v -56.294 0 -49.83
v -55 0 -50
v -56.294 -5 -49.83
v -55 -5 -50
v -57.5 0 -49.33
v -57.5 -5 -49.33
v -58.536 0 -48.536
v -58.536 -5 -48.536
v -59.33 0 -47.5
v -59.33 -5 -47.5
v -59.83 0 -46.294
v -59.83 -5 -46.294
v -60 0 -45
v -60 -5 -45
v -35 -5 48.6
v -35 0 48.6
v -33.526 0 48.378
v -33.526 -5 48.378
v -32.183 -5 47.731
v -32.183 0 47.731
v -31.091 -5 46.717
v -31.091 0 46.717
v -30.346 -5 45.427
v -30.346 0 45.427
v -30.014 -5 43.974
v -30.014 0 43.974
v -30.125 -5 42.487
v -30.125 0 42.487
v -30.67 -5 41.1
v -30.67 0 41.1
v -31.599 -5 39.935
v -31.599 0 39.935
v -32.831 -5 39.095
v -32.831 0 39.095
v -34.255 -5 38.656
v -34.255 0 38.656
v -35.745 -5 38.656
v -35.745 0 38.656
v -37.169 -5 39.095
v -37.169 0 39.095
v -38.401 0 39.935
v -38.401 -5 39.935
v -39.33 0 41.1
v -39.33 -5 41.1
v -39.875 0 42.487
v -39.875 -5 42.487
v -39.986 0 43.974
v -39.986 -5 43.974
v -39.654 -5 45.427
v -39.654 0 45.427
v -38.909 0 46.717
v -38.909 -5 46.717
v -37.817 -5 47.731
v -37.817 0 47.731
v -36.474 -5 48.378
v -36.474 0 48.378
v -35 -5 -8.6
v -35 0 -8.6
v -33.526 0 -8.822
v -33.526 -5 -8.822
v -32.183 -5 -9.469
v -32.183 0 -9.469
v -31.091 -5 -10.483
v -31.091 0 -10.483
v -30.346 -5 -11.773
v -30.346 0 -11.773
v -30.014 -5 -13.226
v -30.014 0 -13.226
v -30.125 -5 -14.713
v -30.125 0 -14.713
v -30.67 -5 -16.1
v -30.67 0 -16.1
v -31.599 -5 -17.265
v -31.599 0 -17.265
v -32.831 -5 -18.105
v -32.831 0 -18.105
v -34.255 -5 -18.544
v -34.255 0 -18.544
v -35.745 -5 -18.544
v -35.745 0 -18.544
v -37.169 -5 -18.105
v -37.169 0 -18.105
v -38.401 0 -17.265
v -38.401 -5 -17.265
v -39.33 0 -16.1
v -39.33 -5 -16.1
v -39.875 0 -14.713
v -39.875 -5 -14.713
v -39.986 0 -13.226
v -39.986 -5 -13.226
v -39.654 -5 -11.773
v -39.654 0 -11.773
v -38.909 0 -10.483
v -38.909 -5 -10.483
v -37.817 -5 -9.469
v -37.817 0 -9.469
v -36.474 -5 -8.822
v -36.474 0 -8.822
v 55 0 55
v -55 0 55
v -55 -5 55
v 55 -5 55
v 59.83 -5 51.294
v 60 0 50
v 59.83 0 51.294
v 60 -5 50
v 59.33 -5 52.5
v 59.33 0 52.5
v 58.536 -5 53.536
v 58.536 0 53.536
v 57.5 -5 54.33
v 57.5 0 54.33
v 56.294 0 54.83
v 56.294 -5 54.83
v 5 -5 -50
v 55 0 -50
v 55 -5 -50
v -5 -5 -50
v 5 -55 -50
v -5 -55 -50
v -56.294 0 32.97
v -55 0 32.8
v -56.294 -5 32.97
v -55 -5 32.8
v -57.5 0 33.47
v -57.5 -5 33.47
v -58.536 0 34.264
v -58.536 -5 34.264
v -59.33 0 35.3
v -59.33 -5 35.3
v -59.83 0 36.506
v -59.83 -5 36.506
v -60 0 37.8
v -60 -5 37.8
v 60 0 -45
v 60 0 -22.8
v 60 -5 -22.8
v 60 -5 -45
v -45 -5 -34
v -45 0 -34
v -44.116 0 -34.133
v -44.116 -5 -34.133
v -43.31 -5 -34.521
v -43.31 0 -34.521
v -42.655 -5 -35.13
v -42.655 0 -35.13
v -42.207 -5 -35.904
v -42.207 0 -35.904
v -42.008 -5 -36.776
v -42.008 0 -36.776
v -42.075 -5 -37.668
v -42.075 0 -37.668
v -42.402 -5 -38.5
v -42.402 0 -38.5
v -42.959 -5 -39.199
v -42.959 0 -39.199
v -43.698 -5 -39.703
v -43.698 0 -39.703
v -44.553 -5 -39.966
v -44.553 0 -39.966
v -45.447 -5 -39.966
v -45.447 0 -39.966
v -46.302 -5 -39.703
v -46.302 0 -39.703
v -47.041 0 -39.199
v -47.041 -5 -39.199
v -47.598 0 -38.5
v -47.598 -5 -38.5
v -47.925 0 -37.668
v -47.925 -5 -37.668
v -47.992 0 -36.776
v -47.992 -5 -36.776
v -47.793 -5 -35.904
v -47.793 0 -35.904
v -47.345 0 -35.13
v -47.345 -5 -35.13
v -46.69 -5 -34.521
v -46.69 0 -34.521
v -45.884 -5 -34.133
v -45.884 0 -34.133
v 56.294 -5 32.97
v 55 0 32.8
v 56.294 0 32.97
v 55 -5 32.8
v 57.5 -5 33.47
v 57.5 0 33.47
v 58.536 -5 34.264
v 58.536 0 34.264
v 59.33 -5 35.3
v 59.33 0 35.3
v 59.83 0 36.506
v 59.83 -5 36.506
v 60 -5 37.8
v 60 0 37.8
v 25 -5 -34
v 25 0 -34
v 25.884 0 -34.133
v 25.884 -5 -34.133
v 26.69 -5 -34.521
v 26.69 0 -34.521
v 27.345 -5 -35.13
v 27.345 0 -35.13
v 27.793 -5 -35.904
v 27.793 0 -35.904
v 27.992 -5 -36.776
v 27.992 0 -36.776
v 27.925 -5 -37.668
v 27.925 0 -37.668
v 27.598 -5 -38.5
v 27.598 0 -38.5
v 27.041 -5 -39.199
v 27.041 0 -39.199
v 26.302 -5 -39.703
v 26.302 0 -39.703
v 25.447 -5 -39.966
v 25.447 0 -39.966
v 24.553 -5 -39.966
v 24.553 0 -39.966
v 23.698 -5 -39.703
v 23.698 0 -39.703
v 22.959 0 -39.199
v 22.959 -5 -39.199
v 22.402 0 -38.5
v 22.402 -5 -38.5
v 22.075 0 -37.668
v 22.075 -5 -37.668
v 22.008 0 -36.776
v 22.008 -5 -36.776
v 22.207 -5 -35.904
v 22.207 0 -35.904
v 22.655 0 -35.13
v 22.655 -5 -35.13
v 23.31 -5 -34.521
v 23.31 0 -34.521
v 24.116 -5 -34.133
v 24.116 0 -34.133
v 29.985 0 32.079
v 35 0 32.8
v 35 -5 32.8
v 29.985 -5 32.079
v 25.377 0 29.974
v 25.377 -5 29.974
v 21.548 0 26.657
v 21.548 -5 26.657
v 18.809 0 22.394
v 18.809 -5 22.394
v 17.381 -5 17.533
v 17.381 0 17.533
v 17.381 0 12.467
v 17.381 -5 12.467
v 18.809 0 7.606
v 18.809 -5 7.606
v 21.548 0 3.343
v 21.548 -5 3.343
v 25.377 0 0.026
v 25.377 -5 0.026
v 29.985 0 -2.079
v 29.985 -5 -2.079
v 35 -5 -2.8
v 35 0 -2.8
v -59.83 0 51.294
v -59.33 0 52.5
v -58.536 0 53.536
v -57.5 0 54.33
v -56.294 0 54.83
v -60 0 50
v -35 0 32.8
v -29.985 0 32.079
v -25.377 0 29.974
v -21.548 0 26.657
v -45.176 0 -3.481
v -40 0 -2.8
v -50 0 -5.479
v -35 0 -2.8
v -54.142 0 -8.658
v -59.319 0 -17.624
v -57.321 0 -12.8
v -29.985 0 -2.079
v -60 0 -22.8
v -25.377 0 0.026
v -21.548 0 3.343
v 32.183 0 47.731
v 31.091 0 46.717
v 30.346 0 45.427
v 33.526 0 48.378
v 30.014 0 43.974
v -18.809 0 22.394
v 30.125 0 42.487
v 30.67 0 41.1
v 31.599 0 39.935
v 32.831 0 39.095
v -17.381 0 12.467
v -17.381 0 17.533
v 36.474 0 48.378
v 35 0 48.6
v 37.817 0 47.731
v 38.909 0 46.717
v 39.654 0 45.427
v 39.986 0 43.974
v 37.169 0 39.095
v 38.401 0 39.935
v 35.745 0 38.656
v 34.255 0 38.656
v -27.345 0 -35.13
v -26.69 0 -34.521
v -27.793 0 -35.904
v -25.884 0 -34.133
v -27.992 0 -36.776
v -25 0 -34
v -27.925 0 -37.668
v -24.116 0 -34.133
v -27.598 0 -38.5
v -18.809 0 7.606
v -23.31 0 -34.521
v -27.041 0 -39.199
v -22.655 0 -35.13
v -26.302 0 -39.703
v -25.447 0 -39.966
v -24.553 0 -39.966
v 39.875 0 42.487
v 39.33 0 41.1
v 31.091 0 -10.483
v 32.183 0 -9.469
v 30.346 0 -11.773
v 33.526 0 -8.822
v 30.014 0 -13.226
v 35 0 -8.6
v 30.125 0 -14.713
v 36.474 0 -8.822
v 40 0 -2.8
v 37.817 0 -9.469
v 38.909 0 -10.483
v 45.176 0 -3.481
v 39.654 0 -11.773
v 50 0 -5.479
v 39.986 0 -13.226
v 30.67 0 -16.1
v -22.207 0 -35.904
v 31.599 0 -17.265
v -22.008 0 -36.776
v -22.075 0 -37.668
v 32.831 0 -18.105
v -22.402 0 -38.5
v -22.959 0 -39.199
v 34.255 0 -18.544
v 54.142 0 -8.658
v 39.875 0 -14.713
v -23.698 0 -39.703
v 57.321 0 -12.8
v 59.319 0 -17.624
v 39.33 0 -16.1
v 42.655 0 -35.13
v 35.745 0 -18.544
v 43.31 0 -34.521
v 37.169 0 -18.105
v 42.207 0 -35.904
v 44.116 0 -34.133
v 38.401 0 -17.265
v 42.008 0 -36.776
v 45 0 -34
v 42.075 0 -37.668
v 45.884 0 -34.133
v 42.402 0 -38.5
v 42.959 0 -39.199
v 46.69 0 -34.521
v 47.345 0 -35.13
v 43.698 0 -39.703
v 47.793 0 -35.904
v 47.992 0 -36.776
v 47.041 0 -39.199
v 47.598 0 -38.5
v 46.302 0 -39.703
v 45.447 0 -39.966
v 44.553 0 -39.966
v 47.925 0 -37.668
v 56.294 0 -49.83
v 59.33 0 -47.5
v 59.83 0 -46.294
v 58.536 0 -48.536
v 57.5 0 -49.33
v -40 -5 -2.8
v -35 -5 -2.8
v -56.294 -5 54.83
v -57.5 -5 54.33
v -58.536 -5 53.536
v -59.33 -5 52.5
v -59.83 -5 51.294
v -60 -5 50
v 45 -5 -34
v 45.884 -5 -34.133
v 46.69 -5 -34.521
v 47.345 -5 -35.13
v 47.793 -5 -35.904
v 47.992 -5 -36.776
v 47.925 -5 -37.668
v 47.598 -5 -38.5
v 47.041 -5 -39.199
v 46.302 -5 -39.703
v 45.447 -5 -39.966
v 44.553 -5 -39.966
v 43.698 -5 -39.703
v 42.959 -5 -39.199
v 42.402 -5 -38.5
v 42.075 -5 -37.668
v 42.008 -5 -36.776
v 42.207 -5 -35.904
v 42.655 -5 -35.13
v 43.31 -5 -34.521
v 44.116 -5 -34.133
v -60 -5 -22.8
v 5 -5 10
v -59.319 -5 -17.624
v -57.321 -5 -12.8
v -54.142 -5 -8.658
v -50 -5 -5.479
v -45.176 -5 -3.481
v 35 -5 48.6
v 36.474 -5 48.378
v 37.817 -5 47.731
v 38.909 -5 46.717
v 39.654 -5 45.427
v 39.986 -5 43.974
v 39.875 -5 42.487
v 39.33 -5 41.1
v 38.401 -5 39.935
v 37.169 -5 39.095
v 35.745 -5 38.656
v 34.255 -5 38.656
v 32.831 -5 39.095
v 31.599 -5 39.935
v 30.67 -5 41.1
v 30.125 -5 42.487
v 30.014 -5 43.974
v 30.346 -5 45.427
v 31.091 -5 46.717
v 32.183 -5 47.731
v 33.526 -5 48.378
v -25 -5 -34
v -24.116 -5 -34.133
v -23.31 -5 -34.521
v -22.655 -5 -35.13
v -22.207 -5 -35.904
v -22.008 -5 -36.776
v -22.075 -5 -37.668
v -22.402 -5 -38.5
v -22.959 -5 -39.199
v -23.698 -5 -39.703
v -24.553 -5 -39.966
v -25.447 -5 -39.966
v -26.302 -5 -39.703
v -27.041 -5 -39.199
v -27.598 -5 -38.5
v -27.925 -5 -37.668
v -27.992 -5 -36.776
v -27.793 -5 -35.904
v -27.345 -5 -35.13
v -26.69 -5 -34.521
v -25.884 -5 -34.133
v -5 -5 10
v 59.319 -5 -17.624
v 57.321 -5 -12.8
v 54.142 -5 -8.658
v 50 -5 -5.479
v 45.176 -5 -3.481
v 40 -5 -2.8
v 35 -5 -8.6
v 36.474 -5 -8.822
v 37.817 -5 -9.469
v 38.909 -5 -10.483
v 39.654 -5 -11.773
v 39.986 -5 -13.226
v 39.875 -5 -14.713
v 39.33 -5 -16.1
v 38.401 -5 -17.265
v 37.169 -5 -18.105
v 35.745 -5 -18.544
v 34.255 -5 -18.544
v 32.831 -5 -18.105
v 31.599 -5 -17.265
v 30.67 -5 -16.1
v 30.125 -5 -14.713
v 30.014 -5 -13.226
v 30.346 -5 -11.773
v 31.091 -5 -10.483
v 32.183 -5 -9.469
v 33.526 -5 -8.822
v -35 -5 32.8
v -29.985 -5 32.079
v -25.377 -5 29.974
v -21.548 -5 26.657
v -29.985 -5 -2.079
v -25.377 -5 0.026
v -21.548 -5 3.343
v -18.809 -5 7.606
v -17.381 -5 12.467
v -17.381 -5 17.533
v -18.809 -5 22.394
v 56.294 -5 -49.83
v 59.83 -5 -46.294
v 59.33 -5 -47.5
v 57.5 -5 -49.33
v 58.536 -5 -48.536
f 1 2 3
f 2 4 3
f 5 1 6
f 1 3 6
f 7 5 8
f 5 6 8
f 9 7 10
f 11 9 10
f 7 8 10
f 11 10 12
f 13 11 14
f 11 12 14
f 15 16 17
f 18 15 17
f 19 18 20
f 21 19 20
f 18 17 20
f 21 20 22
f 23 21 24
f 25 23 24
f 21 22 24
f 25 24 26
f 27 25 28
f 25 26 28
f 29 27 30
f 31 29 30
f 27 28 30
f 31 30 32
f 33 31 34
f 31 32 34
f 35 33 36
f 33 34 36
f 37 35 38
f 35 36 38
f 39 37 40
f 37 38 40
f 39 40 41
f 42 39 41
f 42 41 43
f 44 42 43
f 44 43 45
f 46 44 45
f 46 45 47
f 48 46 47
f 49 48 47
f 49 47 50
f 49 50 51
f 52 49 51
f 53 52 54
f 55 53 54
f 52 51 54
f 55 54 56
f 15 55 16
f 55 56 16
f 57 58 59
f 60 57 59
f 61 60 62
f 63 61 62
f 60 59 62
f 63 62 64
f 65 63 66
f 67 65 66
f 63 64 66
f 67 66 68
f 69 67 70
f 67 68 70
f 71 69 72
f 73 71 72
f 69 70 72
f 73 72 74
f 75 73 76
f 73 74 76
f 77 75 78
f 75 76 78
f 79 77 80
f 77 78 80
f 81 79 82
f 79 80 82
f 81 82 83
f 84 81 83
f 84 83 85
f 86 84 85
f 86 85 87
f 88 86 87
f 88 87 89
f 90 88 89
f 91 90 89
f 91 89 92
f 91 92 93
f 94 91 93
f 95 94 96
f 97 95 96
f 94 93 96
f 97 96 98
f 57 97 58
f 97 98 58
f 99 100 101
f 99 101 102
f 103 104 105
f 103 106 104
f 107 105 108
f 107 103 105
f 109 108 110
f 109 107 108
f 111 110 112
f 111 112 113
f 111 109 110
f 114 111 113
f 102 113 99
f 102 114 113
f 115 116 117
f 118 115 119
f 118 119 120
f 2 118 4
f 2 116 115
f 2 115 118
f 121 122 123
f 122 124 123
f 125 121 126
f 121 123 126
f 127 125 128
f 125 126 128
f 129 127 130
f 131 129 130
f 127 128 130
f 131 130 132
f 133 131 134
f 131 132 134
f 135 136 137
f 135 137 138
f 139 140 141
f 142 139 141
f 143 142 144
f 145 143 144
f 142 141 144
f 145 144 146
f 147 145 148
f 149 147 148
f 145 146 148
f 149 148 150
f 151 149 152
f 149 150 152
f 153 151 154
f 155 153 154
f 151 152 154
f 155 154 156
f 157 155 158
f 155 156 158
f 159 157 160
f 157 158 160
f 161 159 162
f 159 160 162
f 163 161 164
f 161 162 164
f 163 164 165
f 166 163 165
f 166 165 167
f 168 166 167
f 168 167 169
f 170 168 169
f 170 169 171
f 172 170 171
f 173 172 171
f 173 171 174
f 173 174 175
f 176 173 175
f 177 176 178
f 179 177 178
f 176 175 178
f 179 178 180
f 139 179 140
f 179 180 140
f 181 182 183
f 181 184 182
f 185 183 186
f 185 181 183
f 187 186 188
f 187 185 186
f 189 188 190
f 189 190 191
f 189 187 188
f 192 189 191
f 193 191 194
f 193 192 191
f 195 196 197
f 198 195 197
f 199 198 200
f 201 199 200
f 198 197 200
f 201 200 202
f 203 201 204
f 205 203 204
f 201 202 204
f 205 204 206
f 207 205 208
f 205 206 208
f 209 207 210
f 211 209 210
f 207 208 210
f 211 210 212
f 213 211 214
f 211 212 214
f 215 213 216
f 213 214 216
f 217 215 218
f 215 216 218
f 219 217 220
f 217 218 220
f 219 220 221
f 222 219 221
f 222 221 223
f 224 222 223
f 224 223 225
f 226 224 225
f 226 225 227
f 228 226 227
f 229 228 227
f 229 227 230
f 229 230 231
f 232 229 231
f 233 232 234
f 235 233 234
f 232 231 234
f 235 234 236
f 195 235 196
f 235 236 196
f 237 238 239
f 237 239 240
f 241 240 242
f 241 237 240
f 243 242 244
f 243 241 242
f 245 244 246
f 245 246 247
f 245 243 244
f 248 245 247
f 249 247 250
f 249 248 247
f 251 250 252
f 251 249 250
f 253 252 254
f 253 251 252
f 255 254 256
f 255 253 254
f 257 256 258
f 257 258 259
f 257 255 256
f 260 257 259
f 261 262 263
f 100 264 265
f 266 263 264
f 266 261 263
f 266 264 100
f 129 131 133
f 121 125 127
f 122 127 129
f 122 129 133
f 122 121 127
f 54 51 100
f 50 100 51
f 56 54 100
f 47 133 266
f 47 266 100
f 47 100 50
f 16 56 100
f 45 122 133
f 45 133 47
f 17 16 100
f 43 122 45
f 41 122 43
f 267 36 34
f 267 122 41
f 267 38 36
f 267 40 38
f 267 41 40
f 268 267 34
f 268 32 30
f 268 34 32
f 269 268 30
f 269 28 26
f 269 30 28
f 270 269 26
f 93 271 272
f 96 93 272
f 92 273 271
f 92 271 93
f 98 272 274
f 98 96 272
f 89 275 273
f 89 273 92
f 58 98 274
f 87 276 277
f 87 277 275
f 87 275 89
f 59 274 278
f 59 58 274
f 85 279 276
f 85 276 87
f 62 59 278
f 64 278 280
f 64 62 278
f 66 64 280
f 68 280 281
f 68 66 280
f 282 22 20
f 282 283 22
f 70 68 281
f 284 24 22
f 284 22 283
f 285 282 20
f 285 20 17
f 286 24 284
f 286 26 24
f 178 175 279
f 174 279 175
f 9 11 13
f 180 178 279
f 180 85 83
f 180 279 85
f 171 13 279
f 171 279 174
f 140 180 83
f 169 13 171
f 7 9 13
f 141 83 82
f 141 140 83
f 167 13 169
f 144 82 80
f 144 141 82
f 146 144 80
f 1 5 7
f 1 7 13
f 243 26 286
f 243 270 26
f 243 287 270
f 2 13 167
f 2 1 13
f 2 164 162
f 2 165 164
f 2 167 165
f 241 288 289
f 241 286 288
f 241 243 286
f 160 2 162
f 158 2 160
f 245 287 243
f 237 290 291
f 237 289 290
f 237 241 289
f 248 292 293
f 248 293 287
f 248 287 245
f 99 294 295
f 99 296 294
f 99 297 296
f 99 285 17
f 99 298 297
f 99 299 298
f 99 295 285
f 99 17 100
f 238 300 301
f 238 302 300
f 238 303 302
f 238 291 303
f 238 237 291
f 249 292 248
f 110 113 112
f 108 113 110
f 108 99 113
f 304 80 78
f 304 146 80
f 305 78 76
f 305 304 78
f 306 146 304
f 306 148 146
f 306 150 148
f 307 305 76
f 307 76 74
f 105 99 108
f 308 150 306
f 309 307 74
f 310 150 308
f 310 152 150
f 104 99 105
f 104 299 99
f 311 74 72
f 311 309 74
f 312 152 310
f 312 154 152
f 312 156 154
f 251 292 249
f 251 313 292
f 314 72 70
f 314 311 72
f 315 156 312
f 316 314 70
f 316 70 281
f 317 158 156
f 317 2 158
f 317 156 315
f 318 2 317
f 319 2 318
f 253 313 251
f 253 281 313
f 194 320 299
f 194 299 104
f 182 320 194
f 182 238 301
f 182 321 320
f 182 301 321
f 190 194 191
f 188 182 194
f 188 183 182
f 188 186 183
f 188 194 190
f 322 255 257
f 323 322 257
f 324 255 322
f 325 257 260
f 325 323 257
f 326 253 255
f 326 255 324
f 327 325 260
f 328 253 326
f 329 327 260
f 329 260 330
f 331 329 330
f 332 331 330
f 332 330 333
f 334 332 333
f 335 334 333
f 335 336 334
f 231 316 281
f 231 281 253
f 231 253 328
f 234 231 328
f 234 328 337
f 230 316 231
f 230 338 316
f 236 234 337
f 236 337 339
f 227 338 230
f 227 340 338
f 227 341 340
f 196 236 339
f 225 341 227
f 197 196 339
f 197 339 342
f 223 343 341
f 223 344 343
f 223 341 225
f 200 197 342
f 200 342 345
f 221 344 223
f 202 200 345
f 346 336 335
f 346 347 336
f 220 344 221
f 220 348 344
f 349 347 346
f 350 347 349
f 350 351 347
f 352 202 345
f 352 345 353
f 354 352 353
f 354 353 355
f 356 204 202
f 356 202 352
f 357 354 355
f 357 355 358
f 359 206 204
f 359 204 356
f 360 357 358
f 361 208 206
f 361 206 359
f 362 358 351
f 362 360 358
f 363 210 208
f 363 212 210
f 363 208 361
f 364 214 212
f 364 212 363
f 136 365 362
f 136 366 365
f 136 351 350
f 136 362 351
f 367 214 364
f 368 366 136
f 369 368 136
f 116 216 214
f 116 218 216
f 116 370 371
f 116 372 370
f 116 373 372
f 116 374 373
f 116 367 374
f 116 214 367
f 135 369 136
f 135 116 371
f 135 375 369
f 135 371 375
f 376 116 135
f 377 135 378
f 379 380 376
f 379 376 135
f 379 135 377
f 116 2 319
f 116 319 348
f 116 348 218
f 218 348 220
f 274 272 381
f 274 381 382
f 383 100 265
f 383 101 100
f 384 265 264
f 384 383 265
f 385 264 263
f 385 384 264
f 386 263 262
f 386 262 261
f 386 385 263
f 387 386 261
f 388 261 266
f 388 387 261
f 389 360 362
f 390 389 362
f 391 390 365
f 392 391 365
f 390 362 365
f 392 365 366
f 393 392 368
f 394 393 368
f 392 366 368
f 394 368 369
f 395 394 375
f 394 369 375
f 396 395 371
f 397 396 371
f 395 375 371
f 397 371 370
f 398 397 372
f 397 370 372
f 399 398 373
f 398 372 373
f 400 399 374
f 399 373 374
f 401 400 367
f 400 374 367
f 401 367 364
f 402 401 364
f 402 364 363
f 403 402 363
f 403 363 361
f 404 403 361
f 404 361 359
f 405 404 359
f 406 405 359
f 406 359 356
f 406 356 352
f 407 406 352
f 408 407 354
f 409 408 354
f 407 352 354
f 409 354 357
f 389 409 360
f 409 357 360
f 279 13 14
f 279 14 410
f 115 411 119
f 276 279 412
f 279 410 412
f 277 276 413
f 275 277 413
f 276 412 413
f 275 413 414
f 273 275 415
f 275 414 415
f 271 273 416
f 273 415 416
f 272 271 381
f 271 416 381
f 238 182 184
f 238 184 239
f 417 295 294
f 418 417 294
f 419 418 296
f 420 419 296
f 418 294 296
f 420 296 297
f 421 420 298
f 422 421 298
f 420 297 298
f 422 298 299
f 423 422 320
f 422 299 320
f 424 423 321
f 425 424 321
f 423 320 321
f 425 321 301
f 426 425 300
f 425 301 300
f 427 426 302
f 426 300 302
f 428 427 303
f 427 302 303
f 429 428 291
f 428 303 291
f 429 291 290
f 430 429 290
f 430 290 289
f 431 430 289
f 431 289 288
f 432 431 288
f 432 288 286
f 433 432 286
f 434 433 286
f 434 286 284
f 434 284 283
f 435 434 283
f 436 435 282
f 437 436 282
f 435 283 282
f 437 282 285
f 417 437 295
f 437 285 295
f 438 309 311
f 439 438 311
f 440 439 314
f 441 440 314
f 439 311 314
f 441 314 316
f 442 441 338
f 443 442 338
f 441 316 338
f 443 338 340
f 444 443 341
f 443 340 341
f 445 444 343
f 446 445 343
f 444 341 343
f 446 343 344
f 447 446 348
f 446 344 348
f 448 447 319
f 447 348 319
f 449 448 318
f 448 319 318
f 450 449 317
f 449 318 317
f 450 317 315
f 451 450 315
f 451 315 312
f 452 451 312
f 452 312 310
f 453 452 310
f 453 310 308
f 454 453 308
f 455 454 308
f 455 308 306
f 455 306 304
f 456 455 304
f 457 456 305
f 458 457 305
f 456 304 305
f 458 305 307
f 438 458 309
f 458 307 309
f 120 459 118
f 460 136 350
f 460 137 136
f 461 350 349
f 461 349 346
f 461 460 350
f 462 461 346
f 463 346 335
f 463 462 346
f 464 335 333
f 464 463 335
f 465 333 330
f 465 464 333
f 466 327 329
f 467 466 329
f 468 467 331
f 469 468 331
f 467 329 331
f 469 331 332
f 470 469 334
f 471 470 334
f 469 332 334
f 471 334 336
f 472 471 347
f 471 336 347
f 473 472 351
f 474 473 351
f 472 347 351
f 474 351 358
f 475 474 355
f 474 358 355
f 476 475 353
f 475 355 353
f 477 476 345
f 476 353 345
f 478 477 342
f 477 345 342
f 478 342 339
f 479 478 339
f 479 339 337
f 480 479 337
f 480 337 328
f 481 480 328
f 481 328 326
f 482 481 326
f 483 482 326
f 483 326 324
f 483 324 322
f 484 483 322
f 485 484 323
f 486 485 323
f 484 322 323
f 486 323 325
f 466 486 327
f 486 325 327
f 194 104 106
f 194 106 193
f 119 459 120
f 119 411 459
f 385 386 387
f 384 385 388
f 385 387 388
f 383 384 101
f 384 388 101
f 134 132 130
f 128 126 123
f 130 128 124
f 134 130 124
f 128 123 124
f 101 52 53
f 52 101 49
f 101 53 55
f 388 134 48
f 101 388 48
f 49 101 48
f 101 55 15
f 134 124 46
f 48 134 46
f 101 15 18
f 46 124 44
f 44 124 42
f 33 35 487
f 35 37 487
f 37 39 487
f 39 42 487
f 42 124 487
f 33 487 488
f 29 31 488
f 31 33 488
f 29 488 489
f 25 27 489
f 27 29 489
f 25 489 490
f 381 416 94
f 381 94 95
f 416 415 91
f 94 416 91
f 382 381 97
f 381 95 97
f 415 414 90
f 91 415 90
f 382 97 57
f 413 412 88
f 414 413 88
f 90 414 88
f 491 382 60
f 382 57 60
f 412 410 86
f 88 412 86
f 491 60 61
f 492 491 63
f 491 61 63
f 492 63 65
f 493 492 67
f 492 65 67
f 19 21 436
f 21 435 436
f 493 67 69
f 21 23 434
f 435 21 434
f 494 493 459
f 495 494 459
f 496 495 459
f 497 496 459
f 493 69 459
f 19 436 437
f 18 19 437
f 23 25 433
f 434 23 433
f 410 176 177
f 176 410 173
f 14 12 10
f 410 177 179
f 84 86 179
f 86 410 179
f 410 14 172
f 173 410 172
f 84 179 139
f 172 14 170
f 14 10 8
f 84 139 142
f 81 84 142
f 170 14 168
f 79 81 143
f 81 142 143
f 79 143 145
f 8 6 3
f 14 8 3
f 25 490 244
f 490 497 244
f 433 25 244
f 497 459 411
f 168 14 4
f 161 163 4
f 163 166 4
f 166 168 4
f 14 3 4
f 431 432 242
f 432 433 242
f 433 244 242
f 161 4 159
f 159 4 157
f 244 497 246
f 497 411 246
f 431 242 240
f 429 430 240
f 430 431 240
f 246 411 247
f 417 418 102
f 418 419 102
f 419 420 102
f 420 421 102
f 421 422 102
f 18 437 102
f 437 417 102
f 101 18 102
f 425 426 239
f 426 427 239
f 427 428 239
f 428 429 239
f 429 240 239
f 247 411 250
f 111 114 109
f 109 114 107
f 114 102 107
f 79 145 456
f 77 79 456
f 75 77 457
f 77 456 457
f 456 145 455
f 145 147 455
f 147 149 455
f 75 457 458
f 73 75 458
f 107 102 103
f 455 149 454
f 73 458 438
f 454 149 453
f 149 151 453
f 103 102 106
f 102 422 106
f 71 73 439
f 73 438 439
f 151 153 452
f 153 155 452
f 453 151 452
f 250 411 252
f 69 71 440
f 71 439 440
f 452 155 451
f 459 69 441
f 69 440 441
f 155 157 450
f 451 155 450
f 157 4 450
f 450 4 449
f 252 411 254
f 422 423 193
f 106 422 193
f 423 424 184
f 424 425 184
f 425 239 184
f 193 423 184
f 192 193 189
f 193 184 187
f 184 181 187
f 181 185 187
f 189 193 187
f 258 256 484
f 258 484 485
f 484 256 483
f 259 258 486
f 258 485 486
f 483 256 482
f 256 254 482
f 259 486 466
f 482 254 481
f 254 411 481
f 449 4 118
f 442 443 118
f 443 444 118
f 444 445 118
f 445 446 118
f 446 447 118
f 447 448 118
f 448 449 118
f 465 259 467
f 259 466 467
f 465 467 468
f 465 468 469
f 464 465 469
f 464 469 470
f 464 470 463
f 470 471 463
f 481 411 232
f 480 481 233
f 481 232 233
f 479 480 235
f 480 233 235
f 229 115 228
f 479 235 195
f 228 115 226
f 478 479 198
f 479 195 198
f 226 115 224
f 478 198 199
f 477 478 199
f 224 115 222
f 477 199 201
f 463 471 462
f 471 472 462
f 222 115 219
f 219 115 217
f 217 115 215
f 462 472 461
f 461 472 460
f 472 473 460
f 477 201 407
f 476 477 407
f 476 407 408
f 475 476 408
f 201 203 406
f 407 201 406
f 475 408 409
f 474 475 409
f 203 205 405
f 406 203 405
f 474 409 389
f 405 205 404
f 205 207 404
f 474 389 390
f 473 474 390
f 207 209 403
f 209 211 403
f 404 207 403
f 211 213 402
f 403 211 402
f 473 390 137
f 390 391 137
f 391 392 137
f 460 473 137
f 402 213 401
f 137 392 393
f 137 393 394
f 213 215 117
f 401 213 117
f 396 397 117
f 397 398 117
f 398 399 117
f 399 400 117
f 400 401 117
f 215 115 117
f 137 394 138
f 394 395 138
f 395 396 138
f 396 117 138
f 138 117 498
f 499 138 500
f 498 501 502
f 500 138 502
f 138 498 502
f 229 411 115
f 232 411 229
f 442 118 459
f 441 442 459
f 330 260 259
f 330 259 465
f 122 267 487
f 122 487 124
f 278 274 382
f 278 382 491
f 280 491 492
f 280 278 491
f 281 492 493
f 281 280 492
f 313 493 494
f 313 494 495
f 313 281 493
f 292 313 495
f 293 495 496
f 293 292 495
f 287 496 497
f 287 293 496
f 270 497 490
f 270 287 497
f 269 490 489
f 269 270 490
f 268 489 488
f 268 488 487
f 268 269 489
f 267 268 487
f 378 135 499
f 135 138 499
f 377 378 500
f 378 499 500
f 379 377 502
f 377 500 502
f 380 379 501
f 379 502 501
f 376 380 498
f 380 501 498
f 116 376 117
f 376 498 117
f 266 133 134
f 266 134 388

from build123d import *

# Parameters (mm, degrees)
SKETCH1_R           = 5
SKETCH1_R_2         = 3
BOSS_EXTRUDE2_DEPTH = 5
BOSS_EXTRUDE3_DEPTH = 5
FILLET1_R           = 20
FILLET2_R           = 5


with BuildPart() as part:
    # Sketch1 → Boss-Extrude2 (new body)
    with BuildSketch(Plane(origin=(0, 0, 0), x_dir=(1, 0, 0), z_dir=(0, 1, 0))):
        with BuildLine():
            Line((60, 2.8), (60, 50))
            Line((60, 50), (-60, 50))
            Line((-60, 50), (-60, 2.8))
            Line((-60, 2.8), (-35, 2.8))
            ThreePointArc((-35, 2.8), (-17.2, -15), (-35, -32.8))
            Line((-35, -32.8), (-60, -32.8))
            Line((-60, -32.8), (-60, -55))
            Line((-60, -55), (60, -55))
            Line((60, -55), (60, -32.8))
            Line((60, -32.8), (35, -32.8))
            ThreePointArc((35, -32.8), (17.2, -15), (35, 2.8))
            Line((35, 2.8), (60, 2.8))
        make_face()
        with Locations(Location((-35, 13.6, 0), (0, 0, 270))):
            Circle(SKETCH1_R, mode=Mode.SUBTRACT)
        with Locations(Location((-35, -43.6, 0), (0, 0, 270))):
            Circle(SKETCH1_R, mode=Mode.SUBTRACT)
        with Locations(Location((35, 13.6, 0), (0, 0, 270))):
            Circle(SKETCH1_R, mode=Mode.SUBTRACT)
        with Locations(Location((35, -43.6, 0), (0, 0, 270))):
            Circle(SKETCH1_R, mode=Mode.SUBTRACT)
        with Locations(Location((-45, 37, 0), (0, 0, 270))):
            Circle(SKETCH1_R_2, mode=Mode.SUBTRACT)
        with Locations(Location((-25, 37, 0), (0, 0, 270))):
            Circle(SKETCH1_R_2, mode=Mode.SUBTRACT)
        with Locations(Location((25, 37, 0), (0, 0, 270))):
            Circle(SKETCH1_R_2, mode=Mode.SUBTRACT)
        with Locations(Location((45, 37, 0), (0, 0, 270))):
            Circle(SKETCH1_R_2, mode=Mode.SUBTRACT)
    extrude(amount=-BOSS_EXTRUDE2_DEPTH)

    # Sketch2 → Boss-Extrude3 (add, symmetric)
    with BuildSketch(Plane(origin=(0, 0, 0), x_dir=(0, 0, -1), z_dir=(1, 0, 0))):
        Polygon((-10, -5), (50, -55), (50, -5), align=None)
    extrude(amount=BOSS_EXTRUDE3_DEPTH, both=True)

    # Fillet1
    fillet1_edges = [part.edges().sort_by_distance(p)[0] for p in [
        (60, -2.5, -2.8),
        (-60, -2.5, -2.8),
    ]]
    fillet(fillet1_edges, radius=FILLET1_R)

    # Fillet2
    fillet2_edges = [part.edges().sort_by_distance(p)[0] for p in [
        (60, -2.5, -50),
        (60, -2.5, 32.8),
        (60, -2.5, 55),
        (-60, -2.5, 55),
        (-60, -2.5, 32.8),
        (-60, -2.5, -50),
    ]]
    fillet(fillet2_edges, radius=FILLET2_R)


solid = part.part
